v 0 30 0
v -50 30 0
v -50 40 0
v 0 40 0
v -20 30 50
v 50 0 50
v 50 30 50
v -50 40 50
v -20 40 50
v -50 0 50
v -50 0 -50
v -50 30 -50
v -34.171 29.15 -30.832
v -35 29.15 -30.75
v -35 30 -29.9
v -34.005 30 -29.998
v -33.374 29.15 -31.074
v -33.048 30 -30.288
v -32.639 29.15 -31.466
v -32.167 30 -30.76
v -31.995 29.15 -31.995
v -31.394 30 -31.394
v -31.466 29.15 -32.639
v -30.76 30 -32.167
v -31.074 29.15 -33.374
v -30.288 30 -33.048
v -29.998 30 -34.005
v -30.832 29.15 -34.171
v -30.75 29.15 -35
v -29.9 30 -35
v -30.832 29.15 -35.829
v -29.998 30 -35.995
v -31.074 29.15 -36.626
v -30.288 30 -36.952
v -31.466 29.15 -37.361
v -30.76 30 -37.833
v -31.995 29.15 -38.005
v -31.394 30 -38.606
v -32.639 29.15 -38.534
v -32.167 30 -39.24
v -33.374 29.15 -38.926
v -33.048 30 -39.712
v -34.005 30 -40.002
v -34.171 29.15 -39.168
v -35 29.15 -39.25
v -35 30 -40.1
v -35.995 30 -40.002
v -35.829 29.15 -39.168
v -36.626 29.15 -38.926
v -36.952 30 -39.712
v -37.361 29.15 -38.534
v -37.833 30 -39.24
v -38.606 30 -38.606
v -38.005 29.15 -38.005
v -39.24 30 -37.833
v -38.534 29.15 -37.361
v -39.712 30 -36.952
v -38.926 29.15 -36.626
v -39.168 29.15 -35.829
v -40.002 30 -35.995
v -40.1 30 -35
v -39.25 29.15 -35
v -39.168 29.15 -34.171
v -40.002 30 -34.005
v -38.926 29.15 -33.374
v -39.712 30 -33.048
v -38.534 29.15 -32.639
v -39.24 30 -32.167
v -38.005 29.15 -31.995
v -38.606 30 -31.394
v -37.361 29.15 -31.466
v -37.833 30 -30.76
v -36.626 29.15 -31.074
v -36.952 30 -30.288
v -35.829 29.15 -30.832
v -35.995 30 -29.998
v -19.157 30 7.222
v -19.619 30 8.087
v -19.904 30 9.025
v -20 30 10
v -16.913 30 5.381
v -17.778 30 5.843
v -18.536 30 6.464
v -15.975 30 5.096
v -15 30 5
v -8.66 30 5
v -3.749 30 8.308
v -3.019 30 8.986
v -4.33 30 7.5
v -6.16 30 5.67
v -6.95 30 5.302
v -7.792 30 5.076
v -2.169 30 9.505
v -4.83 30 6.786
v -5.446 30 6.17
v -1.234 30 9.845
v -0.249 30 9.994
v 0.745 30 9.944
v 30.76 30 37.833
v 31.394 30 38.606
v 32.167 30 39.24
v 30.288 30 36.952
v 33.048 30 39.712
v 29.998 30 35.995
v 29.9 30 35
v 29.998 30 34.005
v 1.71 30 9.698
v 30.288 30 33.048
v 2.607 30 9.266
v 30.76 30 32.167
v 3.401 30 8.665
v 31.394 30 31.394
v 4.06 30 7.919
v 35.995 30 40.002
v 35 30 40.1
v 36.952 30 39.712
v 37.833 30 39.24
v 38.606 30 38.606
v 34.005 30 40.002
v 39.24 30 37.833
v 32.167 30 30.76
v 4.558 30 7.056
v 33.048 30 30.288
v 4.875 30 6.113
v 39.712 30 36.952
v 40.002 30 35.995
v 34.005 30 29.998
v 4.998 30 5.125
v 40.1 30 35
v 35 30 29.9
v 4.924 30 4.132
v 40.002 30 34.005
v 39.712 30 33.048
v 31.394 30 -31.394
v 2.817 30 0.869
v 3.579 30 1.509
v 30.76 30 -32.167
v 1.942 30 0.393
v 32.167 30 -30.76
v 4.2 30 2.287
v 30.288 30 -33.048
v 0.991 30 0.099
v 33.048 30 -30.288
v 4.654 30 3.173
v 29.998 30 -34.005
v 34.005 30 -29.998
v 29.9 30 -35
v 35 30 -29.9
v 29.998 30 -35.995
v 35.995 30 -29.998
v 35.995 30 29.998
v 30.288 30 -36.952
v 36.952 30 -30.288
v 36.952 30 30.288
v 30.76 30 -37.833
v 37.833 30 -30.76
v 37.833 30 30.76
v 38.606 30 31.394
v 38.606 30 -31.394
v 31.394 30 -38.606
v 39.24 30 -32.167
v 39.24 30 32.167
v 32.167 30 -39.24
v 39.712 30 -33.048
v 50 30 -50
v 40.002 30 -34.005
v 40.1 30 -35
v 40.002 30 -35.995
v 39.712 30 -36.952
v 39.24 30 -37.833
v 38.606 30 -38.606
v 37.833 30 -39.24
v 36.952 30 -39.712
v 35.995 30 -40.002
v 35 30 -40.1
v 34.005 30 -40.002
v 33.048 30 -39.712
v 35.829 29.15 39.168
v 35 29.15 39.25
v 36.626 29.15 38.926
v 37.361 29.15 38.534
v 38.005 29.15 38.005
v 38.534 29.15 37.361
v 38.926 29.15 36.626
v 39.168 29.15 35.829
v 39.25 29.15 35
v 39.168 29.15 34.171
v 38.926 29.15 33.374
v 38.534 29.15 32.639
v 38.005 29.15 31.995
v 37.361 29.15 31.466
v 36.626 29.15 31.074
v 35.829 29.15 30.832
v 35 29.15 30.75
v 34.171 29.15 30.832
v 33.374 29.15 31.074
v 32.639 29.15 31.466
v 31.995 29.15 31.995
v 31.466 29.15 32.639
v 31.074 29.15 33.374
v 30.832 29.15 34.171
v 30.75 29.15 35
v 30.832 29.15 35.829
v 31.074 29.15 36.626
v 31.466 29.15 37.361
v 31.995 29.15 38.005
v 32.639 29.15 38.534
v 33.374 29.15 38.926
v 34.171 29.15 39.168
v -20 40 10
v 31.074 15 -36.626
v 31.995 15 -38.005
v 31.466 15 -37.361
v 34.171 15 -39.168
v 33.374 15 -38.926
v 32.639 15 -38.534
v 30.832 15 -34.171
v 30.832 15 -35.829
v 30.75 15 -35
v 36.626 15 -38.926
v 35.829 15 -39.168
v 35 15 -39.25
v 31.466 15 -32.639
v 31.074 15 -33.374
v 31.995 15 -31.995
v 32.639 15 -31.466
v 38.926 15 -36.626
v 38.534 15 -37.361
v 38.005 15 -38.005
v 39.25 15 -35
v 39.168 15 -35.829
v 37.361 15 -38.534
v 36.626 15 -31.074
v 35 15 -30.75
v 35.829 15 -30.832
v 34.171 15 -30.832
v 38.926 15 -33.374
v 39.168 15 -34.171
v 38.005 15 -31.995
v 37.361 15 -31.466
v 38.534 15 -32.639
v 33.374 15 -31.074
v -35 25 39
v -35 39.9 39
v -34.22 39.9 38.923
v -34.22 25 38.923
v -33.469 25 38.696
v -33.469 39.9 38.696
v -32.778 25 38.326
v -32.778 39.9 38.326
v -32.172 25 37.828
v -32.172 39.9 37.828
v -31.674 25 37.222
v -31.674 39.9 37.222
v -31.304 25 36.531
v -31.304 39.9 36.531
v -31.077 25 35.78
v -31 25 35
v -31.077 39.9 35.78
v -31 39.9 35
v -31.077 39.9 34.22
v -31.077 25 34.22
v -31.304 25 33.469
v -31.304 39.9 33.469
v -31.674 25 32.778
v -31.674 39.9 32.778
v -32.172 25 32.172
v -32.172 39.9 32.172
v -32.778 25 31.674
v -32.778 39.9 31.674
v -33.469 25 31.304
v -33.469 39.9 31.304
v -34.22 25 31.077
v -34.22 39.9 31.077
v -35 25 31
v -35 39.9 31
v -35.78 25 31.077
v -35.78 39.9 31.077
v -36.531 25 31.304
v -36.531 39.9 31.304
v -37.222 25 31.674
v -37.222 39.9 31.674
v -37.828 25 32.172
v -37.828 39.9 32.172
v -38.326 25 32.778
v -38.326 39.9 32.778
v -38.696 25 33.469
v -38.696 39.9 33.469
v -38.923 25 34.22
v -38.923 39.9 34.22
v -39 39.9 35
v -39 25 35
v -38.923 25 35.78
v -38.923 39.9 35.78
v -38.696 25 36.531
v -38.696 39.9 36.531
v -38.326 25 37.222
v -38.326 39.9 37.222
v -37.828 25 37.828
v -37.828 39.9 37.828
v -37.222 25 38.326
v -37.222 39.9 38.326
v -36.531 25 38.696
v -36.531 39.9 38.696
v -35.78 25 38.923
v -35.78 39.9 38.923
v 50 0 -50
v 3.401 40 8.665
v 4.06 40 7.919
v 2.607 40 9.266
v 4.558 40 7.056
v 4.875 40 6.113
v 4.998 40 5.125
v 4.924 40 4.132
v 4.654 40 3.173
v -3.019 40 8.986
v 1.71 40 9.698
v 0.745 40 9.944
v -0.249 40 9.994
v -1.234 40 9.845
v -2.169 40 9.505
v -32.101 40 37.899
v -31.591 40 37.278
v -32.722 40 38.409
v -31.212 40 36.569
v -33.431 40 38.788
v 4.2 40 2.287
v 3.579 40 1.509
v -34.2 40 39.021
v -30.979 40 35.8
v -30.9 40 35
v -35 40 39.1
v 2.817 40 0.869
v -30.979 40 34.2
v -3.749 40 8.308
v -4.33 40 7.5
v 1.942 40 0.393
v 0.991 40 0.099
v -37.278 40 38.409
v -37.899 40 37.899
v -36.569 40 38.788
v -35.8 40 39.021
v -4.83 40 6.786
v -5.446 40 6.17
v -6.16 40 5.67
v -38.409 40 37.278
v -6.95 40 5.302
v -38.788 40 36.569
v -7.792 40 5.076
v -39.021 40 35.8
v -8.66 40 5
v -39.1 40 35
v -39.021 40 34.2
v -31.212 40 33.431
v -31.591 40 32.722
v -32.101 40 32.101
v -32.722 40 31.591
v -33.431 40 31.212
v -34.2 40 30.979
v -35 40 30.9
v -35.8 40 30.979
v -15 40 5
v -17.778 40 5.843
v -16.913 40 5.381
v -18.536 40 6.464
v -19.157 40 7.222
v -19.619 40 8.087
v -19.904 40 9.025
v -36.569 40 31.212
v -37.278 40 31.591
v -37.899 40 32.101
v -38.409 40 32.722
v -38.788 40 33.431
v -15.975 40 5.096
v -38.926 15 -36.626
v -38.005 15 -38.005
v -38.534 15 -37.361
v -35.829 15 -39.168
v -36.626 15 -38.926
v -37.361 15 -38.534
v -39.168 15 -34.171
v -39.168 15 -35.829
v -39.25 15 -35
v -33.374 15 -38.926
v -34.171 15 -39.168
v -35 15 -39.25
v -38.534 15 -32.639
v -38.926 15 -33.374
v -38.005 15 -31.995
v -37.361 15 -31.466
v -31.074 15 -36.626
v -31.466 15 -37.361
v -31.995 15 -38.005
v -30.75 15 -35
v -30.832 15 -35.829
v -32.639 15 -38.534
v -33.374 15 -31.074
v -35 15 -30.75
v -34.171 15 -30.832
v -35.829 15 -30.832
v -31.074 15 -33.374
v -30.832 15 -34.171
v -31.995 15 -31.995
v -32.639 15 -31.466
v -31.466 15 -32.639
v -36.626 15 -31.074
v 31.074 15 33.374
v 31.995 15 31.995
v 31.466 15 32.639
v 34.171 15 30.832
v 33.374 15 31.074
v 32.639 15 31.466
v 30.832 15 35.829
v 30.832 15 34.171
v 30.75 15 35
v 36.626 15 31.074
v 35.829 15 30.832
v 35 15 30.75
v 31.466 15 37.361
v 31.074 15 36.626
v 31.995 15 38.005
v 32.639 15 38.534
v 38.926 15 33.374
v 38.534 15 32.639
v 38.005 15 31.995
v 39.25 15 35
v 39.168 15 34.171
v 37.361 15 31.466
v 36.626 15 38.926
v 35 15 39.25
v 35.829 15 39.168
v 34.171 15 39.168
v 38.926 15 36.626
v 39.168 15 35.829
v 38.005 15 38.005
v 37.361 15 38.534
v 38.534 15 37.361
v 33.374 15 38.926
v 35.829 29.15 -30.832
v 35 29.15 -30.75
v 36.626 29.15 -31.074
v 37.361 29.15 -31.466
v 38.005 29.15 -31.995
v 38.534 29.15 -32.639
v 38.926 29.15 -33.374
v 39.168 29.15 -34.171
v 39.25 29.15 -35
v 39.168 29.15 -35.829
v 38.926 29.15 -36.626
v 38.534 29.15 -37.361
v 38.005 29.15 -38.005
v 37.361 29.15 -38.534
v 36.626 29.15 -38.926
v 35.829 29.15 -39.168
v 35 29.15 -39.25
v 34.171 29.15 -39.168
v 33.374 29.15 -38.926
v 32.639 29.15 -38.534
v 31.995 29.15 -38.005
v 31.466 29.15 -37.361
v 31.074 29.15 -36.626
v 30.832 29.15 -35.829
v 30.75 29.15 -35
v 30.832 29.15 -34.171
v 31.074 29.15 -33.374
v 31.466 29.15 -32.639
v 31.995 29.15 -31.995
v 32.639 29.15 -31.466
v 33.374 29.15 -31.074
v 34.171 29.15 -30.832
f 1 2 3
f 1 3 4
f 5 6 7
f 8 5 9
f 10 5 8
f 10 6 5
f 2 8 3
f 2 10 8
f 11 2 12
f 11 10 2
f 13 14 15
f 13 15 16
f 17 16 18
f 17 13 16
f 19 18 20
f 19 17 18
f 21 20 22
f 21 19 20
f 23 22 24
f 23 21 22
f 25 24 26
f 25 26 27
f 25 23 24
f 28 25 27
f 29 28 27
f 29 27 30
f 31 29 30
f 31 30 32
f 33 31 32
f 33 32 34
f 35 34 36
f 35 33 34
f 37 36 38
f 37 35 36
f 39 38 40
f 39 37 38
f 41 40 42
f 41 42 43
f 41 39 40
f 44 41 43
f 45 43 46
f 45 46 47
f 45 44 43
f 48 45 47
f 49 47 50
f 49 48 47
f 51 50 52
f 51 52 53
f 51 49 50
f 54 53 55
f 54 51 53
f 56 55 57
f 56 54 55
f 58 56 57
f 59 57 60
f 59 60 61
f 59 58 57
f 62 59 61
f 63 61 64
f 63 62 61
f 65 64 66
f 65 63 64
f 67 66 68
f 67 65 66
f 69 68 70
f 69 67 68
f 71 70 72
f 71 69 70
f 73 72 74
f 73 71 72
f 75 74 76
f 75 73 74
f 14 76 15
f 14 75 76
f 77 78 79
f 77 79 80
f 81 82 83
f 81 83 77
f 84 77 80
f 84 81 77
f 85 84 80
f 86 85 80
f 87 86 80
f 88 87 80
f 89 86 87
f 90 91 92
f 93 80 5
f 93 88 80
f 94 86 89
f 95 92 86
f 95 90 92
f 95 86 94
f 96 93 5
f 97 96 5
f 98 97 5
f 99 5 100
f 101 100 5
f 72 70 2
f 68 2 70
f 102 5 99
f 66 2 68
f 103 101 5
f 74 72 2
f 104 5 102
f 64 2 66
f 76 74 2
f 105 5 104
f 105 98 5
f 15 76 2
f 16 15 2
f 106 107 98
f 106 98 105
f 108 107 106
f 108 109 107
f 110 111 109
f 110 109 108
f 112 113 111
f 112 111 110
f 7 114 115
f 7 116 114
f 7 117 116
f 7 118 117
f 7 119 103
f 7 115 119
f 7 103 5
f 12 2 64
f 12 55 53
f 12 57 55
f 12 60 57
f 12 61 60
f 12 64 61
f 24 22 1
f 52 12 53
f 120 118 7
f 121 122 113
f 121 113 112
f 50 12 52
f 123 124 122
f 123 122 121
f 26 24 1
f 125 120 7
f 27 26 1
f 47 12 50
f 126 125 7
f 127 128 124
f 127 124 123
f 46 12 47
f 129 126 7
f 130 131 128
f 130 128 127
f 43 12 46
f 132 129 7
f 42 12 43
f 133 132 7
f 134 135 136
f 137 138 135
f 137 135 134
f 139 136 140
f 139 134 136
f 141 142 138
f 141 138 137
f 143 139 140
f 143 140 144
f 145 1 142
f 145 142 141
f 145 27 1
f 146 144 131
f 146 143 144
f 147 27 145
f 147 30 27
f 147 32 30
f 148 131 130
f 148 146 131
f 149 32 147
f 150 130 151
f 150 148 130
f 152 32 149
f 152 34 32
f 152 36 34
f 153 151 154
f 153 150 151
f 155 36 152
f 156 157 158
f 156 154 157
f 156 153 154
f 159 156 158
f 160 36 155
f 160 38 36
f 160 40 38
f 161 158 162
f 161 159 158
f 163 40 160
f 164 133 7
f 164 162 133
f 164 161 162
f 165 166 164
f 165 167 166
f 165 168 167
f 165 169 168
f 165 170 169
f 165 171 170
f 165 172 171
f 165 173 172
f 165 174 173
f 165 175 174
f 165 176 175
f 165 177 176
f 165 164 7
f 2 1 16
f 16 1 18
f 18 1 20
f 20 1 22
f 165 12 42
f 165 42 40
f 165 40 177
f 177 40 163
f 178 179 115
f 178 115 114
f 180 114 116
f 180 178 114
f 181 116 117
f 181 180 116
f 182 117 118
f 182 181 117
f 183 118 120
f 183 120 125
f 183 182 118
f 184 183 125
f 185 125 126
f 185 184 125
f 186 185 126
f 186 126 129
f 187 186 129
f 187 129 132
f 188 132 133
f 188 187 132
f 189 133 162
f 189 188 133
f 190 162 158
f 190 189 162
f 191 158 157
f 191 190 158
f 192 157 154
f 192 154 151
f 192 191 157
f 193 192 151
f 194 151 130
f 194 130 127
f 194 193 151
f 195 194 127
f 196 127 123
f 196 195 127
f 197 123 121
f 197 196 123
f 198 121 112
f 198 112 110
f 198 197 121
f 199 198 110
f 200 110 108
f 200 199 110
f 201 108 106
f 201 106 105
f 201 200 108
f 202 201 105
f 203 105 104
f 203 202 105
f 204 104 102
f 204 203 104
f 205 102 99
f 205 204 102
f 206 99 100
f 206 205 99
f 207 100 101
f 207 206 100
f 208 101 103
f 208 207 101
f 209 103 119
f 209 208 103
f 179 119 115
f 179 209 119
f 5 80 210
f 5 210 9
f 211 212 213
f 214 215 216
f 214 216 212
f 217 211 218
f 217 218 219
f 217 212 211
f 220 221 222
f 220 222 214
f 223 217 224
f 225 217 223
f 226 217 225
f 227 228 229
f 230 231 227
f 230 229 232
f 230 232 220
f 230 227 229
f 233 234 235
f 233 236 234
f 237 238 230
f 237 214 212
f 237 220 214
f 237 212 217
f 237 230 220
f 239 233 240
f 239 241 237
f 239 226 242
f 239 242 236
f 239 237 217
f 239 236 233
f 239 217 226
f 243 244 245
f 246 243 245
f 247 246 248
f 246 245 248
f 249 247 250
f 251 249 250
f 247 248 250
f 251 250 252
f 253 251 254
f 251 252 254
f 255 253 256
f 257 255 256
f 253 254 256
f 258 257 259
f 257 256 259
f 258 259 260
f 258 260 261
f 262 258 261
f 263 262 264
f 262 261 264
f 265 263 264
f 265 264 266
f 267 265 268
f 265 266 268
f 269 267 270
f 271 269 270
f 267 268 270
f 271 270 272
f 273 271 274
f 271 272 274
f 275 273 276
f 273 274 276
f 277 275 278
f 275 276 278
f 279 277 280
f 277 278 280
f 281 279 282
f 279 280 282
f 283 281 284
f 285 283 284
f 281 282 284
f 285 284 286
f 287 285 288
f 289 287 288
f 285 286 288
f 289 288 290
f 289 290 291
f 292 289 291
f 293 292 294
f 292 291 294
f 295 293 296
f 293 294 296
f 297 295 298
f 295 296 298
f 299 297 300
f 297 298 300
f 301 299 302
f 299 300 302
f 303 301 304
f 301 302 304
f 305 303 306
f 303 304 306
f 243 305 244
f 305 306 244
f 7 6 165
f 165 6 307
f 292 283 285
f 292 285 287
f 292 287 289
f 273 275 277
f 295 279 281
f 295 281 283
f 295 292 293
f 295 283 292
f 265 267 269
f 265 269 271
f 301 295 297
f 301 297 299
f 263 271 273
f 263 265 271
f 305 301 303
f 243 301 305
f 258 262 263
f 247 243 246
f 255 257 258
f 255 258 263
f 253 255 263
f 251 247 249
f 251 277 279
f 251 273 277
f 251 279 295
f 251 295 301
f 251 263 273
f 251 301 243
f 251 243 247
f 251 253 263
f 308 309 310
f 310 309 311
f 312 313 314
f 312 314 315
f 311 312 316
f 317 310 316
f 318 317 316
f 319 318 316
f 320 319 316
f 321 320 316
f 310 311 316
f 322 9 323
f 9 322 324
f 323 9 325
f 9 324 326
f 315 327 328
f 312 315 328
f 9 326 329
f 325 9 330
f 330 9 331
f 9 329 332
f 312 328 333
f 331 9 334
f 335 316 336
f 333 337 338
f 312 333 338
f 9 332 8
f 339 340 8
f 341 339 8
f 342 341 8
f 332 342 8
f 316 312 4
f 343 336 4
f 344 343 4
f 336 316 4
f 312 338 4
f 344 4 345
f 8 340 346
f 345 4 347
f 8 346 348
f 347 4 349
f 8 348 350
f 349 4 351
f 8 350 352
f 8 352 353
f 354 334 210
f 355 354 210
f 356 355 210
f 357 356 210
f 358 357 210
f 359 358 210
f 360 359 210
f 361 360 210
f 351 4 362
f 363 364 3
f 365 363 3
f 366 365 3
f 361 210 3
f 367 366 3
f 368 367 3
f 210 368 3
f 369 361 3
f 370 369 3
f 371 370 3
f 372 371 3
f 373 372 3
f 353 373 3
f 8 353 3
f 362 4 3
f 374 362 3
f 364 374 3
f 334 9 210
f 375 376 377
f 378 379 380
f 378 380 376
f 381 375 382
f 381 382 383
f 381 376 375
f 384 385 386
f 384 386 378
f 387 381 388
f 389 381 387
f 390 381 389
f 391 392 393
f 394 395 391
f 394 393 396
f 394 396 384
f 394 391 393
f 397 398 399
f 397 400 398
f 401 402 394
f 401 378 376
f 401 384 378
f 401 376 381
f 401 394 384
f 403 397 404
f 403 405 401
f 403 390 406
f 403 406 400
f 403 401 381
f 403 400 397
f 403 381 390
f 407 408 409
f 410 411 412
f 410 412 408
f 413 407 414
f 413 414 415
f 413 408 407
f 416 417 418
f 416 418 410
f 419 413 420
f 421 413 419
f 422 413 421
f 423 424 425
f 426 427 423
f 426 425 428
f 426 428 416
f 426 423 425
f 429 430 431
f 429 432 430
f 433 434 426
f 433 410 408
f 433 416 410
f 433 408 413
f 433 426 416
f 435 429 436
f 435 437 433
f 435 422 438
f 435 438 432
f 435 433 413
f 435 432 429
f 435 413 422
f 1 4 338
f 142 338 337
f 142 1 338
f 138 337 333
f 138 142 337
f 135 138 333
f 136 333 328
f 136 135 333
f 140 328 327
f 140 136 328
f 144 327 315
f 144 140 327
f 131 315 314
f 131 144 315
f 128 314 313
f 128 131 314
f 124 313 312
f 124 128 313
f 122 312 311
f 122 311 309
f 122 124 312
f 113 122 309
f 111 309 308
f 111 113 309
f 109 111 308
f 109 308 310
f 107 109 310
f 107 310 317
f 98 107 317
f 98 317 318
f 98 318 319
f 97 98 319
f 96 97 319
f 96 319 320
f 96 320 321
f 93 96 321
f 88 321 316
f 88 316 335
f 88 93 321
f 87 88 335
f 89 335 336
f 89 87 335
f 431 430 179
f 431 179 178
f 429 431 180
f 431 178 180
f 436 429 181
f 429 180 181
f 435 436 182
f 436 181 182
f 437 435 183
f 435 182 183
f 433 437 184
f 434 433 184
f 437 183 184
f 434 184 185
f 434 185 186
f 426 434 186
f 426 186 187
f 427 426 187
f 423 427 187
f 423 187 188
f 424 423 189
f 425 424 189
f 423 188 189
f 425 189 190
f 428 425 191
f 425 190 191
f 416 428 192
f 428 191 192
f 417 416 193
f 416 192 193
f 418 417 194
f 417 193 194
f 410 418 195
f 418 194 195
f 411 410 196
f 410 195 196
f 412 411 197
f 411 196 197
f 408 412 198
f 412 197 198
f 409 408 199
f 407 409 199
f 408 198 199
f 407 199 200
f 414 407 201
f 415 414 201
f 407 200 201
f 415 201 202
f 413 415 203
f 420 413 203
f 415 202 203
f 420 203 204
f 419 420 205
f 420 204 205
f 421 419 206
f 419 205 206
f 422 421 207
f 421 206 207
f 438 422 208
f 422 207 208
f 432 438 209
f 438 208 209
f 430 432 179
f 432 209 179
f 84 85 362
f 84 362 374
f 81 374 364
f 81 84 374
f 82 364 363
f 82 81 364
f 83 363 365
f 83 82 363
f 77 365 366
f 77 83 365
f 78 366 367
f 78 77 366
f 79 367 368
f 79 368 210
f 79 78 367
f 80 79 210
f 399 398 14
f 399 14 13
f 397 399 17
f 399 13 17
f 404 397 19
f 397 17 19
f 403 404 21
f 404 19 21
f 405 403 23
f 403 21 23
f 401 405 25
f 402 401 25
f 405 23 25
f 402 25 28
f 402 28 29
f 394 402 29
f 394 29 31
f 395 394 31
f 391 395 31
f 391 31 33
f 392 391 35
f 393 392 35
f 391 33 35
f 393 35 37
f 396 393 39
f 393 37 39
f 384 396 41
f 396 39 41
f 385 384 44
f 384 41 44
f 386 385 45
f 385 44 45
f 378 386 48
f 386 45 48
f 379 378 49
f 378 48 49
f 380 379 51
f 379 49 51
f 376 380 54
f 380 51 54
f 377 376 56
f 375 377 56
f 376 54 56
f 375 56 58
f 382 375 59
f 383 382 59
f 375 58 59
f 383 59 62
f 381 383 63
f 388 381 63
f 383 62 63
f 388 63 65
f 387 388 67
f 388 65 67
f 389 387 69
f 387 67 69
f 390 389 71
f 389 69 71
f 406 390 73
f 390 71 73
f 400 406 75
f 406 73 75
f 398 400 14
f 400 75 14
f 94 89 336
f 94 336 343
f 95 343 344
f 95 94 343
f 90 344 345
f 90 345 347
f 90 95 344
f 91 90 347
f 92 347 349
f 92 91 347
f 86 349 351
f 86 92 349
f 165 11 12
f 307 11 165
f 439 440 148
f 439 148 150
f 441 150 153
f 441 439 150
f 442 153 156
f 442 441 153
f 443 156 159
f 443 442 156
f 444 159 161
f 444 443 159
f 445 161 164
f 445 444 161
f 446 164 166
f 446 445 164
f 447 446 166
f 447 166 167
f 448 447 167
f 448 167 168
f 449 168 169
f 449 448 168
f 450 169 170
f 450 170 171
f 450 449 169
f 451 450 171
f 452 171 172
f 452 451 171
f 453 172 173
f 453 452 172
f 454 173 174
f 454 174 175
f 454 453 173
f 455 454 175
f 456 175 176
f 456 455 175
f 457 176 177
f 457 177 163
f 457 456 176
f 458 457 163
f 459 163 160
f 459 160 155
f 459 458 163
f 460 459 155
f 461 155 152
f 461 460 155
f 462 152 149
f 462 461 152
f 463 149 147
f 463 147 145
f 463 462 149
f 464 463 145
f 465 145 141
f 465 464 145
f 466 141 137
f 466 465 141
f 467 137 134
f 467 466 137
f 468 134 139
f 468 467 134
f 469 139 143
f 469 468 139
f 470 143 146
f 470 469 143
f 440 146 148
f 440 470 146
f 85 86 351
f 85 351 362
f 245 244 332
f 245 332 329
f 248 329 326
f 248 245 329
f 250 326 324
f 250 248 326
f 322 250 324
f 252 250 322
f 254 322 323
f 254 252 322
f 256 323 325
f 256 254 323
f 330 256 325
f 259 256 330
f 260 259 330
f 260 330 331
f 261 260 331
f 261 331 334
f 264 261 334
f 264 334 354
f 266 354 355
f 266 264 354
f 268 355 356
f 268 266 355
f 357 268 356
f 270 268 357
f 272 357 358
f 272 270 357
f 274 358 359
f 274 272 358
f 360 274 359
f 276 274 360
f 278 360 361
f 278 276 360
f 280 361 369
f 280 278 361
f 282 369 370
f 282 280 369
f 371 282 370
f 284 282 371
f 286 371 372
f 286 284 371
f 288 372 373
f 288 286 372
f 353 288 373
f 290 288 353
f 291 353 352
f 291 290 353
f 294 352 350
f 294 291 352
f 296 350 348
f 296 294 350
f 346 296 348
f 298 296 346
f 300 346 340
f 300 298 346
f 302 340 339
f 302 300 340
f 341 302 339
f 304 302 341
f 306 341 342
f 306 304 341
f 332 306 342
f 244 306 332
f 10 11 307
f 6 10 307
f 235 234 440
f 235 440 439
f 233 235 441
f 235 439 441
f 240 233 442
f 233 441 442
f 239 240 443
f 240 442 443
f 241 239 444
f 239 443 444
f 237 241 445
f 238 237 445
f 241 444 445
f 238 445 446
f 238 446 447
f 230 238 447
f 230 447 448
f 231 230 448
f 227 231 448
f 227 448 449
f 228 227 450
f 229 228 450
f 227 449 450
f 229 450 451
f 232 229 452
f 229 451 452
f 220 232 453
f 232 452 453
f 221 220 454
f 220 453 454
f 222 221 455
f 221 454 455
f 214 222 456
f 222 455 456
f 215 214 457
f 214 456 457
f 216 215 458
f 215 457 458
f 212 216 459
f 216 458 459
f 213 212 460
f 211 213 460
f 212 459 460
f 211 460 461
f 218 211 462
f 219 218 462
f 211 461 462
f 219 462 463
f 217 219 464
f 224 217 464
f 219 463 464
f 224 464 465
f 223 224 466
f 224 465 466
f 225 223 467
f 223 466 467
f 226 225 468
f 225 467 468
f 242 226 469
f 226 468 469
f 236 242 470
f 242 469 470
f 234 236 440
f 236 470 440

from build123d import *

# Parameters (mm, degrees)
SKETCH2_W           = 100
SKETCH2_H           = 100
BOSS_EXTRUDE1_DEPTH = 30
BOSS_EXTRUDE2_DEPTH = 10
SKETCH5_R           = 4.25
CUT_EXTRUDE1_DEPTH  = 15
CHAMFER1_SIZE       = 0.85
SKETCH7_R           = 4
CUT_EXTRUDE2_DEPTH  = 15
CHAMFER2_SIZE       = 0.1


with BuildPart() as part:
    # Sketch2 → Boss-Extrude1 (new body)
    with BuildSketch(Plane(origin=(0, 0, 0), x_dir=(1, 0, 0), z_dir=(0, 1, 0))):
        Rectangle(SKETCH2_W, SKETCH2_H)
    extrude(amount=BOSS_EXTRUDE1_DEPTH)

    # Sketch4 → Boss-Extrude2 (add)
    with BuildSketch(Plane(origin=(0, 30, 0), x_dir=(1, 0, 0), z_dir=(0, 1, 0))):
        with BuildLine():
            Line((-50, -50), (-50, 0))
            Line((-50, 0), (0, 0))
            ThreePointArc((0, 0), (4.330127019, -7.5), (-4.330127019, -7.5))
            ThreePointArc((-4.330127019, -7.5), (-6.160254038, -5.669872981), (-8.660254038, -5))
            Line((-8.660254038, -5), (-15, -5))
            ThreePointArc((-15, -5), (-18.535533906, -6.464466094), (-20, -10))
            Line((-20, -10), (-20, -50))
            Line((-20, -50), (-50, -50))
        make_face()
    extrude(amount=BOSS_EXTRUDE2_DEPTH)

    # Sketch5 → Cut-Extrude1 (cut)
    with BuildSketch(Plane(origin=(0, 30, 0), x_dir=(1, 0, 0), z_dir=(0, 1, 0))):
        with Locations(Location((35, 35, 0), (0, 0, 270))):
            Circle(SKETCH5_R)
        with Locations(Location((-35, 35, 0), (0, 0, 270))):
            Circle(SKETCH5_R)
        with Locations(Location((35, -35, 0), (0, 0, 270))):
            Circle(SKETCH5_R)
    extrude(amount=-CUT_EXTRUDE1_DEPTH, mode=Mode.SUBTRACT)

    # Chamfer1
    chamfer1_edges = [part.edges().sort_by_distance(p)[0] for p in [
        (35, 30, 30.75),
        (-35, 30, -39.25),
        (35, 30, -39.25),
    ]]
    chamfer(chamfer1_edges, length=CHAMFER1_SIZE)

    # Sketch7 → Cut-Extrude2 (cut)
    with BuildSketch(Plane(origin=(0, 40, 0), x_dir=(1, 0, 0), z_dir=(0, 1, 0))):
        with Locations(Location((-35, -35, 0), (0, 0, 270))):
            Circle(SKETCH7_R)
    extrude(amount=-CUT_EXTRUDE2_DEPTH, mode=Mode.SUBTRACT)

    # Chamfer2
    chamfer2_edges = [part.edges().sort_by_distance(p)[0] for p in [
        (-35, 40, 31),
    ]]
    chamfer(chamfer2_edges, length=CHAMFER2_SIZE)


solid = part.part
